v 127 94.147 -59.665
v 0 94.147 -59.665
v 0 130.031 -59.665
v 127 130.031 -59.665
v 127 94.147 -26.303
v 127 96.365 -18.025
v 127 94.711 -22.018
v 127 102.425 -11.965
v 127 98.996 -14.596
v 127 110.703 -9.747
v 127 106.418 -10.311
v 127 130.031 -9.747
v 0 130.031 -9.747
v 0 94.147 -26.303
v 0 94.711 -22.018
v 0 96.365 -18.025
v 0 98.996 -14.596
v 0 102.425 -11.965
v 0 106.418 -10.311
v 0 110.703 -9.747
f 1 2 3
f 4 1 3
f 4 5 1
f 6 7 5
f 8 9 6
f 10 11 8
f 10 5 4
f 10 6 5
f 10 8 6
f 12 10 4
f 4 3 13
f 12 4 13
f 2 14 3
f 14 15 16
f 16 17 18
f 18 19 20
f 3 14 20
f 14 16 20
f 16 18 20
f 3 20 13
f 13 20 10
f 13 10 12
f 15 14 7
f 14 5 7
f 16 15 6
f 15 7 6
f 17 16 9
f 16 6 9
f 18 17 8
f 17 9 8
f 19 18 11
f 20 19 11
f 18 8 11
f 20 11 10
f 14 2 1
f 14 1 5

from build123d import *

# Parameters (mm, degrees)
F0_W     = 35.884626
F0_H     = 49.918497
F1_DEPTH = 127
F2_R     = 16.556677


with BuildPart() as f1:
    # F0 (on Right) → F1 (new body)
    with BuildSketch(Plane.YZ):
        with Locations((112.088945, -34.705921)):
            Rectangle(F0_W, F0_H)
    extrude(amount=F1_DEPTH)

    # F2
    f2_edges = [f1.edges().sort_by_distance(p)[0] for p in [
        (63.5, 94.146632, -9.746673),
    ]]
    fillet(f2_edges, radius=F2_R)


solid = f1.part
